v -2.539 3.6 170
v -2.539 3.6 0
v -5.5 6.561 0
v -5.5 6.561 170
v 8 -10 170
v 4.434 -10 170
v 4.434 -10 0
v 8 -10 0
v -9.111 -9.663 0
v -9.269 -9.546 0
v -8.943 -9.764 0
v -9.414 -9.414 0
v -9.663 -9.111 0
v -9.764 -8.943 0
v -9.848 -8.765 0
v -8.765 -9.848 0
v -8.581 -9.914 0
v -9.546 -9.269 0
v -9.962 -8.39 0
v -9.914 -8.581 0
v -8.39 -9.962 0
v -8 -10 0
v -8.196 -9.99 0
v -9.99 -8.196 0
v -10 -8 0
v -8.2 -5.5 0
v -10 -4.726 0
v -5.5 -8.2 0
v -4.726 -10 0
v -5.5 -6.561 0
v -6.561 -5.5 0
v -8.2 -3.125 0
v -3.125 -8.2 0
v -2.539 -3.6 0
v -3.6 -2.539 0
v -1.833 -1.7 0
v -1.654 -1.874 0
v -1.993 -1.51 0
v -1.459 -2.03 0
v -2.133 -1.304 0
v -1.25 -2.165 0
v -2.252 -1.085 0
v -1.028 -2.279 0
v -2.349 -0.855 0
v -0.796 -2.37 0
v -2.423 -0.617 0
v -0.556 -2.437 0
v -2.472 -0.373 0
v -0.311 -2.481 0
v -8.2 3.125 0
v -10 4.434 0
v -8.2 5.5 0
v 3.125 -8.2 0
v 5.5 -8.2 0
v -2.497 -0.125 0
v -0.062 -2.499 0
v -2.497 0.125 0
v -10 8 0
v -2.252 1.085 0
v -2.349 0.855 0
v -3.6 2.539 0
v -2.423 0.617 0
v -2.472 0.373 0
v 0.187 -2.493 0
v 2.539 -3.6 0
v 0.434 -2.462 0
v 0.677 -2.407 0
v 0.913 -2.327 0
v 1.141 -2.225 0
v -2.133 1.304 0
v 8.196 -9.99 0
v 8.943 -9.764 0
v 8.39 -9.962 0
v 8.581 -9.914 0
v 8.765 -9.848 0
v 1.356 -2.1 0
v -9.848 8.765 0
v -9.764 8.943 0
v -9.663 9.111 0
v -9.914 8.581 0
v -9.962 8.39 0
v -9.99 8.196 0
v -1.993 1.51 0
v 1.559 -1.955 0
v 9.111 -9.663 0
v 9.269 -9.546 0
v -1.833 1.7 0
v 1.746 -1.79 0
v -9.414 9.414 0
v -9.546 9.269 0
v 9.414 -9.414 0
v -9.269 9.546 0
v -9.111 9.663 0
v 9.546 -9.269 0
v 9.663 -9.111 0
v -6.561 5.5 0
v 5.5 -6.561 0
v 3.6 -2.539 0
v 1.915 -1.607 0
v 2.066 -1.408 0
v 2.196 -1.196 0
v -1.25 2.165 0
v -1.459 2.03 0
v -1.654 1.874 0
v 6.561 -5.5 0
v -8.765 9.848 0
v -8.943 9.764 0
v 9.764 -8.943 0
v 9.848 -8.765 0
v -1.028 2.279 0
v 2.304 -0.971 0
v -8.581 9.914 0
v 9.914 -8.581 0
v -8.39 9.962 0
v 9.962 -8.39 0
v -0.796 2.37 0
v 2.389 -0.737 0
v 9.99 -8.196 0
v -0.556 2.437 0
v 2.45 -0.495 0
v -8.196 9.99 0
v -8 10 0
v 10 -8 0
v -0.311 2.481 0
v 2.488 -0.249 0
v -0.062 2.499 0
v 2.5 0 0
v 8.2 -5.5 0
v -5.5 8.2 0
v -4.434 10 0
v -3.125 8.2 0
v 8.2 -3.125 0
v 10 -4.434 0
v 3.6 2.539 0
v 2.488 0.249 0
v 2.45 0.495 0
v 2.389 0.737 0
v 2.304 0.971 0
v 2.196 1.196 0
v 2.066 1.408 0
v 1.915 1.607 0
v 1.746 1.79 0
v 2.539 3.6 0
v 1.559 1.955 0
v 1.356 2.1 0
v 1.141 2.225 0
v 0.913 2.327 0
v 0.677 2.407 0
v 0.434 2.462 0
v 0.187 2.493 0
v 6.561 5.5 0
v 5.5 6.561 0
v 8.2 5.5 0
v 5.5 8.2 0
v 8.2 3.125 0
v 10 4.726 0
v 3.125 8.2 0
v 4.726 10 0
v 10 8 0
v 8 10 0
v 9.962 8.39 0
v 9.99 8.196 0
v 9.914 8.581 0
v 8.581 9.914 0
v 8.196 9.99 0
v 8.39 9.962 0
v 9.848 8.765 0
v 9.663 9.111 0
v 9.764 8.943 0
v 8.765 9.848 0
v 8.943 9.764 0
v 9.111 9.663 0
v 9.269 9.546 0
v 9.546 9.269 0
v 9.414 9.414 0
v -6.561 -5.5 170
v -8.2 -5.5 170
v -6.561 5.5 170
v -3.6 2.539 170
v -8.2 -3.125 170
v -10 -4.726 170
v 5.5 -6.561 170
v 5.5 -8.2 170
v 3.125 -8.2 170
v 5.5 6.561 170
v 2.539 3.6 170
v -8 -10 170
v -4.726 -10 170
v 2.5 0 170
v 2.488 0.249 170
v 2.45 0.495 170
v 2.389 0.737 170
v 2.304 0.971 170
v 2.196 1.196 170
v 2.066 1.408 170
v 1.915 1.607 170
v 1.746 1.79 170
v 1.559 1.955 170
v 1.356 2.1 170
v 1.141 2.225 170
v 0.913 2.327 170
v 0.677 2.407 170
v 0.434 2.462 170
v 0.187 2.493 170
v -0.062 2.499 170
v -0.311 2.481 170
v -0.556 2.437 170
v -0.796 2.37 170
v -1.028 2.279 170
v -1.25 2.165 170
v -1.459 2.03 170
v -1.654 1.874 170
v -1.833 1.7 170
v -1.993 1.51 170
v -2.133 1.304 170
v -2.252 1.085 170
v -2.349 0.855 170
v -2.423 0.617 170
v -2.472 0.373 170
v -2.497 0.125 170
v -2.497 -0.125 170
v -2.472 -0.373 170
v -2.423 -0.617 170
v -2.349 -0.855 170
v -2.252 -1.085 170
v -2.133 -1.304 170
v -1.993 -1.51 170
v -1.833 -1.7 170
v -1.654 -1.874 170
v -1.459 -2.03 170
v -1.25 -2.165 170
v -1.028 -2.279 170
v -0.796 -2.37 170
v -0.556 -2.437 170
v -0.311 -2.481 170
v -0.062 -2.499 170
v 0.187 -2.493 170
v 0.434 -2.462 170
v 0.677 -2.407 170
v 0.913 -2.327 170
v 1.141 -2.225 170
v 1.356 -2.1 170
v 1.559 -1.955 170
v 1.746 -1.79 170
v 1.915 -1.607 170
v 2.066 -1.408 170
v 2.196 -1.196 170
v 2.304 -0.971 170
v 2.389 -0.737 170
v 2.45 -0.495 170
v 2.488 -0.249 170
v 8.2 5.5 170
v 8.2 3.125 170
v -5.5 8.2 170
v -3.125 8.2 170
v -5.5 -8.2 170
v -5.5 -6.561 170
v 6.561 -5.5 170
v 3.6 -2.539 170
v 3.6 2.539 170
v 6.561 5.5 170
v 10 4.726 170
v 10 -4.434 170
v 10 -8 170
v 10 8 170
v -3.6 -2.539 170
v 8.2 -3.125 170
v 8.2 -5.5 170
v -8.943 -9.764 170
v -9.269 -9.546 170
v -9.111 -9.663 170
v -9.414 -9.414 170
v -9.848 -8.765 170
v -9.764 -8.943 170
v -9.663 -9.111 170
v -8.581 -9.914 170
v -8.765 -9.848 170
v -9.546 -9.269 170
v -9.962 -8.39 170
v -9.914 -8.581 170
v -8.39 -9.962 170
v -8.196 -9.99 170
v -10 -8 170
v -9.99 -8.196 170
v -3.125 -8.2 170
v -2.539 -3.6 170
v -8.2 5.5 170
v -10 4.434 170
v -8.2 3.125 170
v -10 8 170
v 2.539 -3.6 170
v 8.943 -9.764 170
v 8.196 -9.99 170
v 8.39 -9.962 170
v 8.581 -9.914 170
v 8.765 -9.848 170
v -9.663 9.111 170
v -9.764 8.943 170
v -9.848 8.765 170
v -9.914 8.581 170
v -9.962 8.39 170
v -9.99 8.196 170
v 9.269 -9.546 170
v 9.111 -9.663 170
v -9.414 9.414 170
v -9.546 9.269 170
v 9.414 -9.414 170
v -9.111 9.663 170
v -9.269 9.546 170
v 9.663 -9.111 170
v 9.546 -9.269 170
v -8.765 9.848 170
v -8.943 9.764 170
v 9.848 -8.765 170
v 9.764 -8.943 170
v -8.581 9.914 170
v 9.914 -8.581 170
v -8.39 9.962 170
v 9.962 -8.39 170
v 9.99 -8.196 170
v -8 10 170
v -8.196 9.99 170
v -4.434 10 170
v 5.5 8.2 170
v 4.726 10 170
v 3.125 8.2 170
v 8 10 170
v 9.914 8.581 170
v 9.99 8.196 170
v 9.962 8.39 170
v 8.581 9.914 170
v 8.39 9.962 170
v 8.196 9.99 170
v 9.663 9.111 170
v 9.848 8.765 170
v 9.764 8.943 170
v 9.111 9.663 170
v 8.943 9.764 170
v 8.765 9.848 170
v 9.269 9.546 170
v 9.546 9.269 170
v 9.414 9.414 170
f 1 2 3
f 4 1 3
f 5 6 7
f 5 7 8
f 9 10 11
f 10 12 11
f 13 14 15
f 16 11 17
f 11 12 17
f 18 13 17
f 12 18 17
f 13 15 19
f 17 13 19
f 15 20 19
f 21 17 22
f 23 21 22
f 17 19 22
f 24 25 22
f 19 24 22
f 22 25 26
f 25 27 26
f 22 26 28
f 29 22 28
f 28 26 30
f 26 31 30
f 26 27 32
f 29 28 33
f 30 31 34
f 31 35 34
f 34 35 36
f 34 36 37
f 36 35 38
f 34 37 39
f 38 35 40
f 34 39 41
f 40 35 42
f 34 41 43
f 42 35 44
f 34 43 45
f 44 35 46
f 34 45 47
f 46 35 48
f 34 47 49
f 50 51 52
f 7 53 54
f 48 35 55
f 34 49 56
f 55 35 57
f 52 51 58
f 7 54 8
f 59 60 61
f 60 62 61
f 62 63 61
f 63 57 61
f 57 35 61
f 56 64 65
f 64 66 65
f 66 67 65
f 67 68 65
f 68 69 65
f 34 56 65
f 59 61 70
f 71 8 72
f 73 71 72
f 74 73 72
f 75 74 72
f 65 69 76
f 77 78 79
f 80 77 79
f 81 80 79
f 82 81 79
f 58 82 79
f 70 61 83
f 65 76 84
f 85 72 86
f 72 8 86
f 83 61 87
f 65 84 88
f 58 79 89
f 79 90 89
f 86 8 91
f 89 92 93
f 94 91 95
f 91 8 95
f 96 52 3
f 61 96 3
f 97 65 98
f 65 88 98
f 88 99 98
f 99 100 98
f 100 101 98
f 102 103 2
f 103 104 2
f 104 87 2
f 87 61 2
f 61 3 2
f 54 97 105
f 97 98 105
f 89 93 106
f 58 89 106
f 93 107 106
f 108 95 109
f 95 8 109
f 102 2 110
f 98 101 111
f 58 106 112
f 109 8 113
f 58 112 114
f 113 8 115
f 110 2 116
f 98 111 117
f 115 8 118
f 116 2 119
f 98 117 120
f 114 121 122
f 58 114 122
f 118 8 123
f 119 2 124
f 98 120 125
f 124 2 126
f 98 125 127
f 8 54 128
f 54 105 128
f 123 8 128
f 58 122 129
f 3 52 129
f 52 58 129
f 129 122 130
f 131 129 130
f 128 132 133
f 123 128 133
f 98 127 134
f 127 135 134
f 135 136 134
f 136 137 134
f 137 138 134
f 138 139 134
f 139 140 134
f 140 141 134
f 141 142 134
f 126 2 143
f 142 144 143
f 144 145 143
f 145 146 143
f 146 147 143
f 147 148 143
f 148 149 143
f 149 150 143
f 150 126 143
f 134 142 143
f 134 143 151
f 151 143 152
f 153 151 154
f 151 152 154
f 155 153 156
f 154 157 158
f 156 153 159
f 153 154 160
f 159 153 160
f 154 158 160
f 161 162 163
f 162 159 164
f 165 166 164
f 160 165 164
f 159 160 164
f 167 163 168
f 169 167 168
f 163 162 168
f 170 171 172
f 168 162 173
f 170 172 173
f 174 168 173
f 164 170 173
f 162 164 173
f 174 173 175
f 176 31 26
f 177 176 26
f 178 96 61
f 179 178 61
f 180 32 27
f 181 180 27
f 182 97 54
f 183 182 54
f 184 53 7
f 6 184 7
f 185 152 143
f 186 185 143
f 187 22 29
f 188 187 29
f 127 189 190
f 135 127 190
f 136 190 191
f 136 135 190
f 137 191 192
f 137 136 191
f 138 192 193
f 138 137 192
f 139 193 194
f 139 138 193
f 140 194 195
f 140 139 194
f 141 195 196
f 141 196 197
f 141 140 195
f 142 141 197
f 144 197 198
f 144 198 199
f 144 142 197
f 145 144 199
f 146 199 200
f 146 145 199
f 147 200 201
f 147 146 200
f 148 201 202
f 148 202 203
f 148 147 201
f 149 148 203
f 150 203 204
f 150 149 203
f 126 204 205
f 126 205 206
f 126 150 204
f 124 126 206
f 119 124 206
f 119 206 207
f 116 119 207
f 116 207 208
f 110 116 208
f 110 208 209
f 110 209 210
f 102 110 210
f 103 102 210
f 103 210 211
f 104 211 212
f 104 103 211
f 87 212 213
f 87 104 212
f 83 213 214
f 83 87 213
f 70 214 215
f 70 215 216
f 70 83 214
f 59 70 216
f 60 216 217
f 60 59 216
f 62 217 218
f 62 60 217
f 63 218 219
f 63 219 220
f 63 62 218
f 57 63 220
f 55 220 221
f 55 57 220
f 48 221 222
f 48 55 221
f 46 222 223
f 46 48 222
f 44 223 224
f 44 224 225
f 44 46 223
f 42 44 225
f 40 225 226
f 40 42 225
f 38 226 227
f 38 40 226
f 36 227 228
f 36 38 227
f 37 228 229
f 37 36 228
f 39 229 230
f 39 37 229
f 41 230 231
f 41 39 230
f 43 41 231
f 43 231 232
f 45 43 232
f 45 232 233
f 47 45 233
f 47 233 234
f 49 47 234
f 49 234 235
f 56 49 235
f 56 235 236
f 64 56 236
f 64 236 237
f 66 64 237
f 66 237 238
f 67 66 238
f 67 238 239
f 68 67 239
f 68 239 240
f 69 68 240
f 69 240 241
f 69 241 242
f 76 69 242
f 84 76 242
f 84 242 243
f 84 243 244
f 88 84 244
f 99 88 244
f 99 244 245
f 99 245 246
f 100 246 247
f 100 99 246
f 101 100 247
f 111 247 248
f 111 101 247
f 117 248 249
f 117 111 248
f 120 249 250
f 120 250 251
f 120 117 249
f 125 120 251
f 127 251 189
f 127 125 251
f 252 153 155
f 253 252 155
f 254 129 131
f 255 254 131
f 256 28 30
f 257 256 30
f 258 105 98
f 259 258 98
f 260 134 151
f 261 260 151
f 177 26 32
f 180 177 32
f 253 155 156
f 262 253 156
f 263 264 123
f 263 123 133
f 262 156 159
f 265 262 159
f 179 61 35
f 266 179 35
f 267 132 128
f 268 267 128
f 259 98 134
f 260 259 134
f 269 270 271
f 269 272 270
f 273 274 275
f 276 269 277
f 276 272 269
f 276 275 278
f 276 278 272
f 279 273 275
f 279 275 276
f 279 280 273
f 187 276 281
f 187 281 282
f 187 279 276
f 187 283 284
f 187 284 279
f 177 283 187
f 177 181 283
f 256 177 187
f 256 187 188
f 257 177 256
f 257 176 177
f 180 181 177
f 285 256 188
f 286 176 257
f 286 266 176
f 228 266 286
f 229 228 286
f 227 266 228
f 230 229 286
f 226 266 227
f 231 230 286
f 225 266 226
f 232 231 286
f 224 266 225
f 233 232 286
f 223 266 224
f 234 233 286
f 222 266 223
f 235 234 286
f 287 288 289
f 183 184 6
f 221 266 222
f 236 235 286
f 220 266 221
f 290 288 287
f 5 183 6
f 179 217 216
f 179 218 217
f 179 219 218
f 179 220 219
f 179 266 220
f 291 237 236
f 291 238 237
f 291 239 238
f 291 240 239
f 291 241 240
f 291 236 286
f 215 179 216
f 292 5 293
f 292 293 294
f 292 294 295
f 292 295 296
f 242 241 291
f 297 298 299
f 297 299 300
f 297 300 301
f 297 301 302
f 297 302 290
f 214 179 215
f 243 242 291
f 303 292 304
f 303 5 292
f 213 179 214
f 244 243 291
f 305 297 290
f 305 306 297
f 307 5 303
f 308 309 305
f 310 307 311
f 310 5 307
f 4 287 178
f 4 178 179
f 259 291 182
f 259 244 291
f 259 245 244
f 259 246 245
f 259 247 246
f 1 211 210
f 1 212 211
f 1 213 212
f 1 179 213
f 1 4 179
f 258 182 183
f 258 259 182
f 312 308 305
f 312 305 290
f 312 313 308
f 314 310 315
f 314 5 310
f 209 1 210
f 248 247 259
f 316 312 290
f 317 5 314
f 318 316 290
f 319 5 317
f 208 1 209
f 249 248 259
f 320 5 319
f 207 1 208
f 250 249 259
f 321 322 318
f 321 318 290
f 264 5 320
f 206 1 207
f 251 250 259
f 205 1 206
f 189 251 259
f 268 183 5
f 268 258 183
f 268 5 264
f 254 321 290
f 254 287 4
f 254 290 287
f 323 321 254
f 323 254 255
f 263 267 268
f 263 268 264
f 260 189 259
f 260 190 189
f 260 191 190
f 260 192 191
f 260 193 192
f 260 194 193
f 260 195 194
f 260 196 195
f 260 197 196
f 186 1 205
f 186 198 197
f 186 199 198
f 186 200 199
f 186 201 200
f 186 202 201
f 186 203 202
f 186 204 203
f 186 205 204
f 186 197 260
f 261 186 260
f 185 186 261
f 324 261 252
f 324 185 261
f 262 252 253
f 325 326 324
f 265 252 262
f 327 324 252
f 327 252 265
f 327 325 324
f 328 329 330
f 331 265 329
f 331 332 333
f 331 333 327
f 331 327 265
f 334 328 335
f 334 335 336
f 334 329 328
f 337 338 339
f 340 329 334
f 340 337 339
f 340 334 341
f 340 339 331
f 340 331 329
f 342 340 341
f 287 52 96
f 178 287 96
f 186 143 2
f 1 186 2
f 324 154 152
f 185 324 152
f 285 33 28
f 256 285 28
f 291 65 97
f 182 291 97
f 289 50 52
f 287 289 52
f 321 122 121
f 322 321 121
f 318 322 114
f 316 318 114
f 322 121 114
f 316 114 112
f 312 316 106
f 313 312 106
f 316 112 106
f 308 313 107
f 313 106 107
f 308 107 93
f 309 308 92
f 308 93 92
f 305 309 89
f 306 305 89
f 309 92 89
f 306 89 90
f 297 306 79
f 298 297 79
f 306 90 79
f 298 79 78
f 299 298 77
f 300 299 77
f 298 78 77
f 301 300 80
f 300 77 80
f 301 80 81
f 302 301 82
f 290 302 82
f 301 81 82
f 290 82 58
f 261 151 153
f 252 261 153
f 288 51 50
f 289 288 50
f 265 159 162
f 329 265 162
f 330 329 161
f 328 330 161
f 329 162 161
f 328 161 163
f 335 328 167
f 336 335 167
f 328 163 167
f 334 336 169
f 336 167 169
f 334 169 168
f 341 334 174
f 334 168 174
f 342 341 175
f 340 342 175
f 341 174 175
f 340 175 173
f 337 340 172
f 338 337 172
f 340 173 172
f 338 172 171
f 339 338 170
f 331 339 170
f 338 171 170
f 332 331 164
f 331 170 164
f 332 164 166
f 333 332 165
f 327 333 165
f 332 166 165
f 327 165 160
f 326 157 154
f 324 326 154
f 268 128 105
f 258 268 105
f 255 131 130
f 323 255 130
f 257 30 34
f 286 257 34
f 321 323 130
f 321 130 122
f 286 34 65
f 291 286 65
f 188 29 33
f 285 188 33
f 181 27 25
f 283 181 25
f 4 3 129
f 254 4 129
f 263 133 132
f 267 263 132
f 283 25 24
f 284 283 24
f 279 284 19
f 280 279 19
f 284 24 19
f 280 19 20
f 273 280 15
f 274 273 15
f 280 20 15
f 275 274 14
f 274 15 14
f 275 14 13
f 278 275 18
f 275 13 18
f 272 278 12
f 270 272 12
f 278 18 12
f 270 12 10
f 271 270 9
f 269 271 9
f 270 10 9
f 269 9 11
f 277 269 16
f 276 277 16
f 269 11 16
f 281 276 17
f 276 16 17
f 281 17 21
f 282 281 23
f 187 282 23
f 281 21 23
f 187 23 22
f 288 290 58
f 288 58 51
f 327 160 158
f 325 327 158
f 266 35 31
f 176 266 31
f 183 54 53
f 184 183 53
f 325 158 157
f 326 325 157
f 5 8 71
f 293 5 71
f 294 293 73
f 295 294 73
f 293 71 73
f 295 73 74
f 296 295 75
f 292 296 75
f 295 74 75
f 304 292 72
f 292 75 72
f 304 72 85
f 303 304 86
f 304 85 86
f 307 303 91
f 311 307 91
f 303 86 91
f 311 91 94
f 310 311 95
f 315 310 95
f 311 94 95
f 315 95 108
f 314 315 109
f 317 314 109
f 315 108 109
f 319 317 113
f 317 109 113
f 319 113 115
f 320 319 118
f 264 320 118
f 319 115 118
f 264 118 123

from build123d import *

# Parameters (mm, degrees)
SKETCH1_R               = 2.5
ALUMINIUM_PROFILE_DEPTH = 170


with BuildPart() as part:
    # Sketch1 → Aluminium_profile (new body)
    with BuildSketch(Plane.XY):
        with BuildLine():
            Line((-4.725542729, -10), (-3.125, -8.2))
            Line((-3.125, -8.2), (-5.5, -8.2))
            Line((-5.5, -8.2), (-5.5, -6.560660172))
            Line((-5.5, -6.560660172), (-2.539339828, -3.6))
            Line((-2.539339828, -3.6), (2.539339828, -3.6))
            Line((2.539339828, -3.6), (5.5, -6.560660172))
            Line((5.5, -6.560660172), (5.5, -8.2))
            Line((5.5, -8.2), (3.125, -8.2))
            Line((3.125, -8.2), (4.434457271, -10))
            Line((4.434457271, -10), (8, -10))
            ThreePointArc((8, -10), (9.414213562, -9.414213562), (10, -8))
            Line((10, -8), (10, -4.434457271))
            Line((10, -4.434457271), (8.2, -3.125))
            Line((8.2, -3.125), (8.2, -5.5))
            Line((8.2, -5.5), (6.560660172, -5.5))
            Line((6.560660172, -5.5), (3.6, -2.539339828))
            Line((3.6, -2.539339828), (3.6, 2.539339828))
            Line((3.6, 2.539339828), (6.560660172, 5.5))
            Line((6.560660172, 5.5), (8.2, 5.5))
            Line((8.2, 5.5), (8.2, 3.125))
            Line((8.2, 3.125), (10, 4.725542729))
            Line((10, 4.725542729), (10, 8))
            ThreePointArc((10, 8), (9.414213562, 9.414213562), (8, 10))
            Line((8, 10), (4.725542729, 10))
            Line((4.725542729, 10), (3.125, 8.2))
            Line((3.125, 8.2), (5.5, 8.2))
            Line((5.5, 8.2), (5.5, 6.560660172))
            Line((5.5, 6.560660172), (2.539339828, 3.6))
            Line((2.539339828, 3.6), (-2.539339828, 3.6))
            Line((-2.539339828, 3.6), (-5.5, 6.560660172))
            Line((-5.5, 6.560660172), (-5.5, 8.2))
            Line((-5.5, 8.2), (-3.125, 8.2))
            Line((-3.125, 8.2), (-4.434457271, 10))
            Line((-4.434457271, 10), (-8, 10))
            ThreePointArc((-8, 10), (-9.414213562, 9.414213562), (-10, 8))
            Line((-10, 8), (-10, 4.434457271))
            Line((-10, 4.434457271), (-8.2, 3.125))
            Line((-8.2, 3.125), (-8.2, 5.5))
            Line((-8.2, 5.5), (-6.560660172, 5.5))
            Line((-6.560660172, 5.5), (-3.6, 2.539339828))
            Line((-3.6, 2.539339828), (-3.6, -2.539339828))
            Line((-3.6, -2.539339828), (-6.560660172, -5.5))
            Line((-6.560660172, -5.5), (-8.2, -5.5))
            Line((-8.2, -5.5), (-8.2, -3.125))
            Line((-8.2, -3.125), (-10, -4.725542729))
            Line((-10, -4.725542729), (-10, -8))
            ThreePointArc((-10, -8), (-9.414213562, -9.414213562), (-8, -10))
            Line((-8, -10), (-4.725542729, -10))
        make_face()
        Circle(SKETCH1_R, mode=Mode.SUBTRACT)
    extrude(amount=ALUMINIUM_PROFILE_DEPTH)


solid = part.part
